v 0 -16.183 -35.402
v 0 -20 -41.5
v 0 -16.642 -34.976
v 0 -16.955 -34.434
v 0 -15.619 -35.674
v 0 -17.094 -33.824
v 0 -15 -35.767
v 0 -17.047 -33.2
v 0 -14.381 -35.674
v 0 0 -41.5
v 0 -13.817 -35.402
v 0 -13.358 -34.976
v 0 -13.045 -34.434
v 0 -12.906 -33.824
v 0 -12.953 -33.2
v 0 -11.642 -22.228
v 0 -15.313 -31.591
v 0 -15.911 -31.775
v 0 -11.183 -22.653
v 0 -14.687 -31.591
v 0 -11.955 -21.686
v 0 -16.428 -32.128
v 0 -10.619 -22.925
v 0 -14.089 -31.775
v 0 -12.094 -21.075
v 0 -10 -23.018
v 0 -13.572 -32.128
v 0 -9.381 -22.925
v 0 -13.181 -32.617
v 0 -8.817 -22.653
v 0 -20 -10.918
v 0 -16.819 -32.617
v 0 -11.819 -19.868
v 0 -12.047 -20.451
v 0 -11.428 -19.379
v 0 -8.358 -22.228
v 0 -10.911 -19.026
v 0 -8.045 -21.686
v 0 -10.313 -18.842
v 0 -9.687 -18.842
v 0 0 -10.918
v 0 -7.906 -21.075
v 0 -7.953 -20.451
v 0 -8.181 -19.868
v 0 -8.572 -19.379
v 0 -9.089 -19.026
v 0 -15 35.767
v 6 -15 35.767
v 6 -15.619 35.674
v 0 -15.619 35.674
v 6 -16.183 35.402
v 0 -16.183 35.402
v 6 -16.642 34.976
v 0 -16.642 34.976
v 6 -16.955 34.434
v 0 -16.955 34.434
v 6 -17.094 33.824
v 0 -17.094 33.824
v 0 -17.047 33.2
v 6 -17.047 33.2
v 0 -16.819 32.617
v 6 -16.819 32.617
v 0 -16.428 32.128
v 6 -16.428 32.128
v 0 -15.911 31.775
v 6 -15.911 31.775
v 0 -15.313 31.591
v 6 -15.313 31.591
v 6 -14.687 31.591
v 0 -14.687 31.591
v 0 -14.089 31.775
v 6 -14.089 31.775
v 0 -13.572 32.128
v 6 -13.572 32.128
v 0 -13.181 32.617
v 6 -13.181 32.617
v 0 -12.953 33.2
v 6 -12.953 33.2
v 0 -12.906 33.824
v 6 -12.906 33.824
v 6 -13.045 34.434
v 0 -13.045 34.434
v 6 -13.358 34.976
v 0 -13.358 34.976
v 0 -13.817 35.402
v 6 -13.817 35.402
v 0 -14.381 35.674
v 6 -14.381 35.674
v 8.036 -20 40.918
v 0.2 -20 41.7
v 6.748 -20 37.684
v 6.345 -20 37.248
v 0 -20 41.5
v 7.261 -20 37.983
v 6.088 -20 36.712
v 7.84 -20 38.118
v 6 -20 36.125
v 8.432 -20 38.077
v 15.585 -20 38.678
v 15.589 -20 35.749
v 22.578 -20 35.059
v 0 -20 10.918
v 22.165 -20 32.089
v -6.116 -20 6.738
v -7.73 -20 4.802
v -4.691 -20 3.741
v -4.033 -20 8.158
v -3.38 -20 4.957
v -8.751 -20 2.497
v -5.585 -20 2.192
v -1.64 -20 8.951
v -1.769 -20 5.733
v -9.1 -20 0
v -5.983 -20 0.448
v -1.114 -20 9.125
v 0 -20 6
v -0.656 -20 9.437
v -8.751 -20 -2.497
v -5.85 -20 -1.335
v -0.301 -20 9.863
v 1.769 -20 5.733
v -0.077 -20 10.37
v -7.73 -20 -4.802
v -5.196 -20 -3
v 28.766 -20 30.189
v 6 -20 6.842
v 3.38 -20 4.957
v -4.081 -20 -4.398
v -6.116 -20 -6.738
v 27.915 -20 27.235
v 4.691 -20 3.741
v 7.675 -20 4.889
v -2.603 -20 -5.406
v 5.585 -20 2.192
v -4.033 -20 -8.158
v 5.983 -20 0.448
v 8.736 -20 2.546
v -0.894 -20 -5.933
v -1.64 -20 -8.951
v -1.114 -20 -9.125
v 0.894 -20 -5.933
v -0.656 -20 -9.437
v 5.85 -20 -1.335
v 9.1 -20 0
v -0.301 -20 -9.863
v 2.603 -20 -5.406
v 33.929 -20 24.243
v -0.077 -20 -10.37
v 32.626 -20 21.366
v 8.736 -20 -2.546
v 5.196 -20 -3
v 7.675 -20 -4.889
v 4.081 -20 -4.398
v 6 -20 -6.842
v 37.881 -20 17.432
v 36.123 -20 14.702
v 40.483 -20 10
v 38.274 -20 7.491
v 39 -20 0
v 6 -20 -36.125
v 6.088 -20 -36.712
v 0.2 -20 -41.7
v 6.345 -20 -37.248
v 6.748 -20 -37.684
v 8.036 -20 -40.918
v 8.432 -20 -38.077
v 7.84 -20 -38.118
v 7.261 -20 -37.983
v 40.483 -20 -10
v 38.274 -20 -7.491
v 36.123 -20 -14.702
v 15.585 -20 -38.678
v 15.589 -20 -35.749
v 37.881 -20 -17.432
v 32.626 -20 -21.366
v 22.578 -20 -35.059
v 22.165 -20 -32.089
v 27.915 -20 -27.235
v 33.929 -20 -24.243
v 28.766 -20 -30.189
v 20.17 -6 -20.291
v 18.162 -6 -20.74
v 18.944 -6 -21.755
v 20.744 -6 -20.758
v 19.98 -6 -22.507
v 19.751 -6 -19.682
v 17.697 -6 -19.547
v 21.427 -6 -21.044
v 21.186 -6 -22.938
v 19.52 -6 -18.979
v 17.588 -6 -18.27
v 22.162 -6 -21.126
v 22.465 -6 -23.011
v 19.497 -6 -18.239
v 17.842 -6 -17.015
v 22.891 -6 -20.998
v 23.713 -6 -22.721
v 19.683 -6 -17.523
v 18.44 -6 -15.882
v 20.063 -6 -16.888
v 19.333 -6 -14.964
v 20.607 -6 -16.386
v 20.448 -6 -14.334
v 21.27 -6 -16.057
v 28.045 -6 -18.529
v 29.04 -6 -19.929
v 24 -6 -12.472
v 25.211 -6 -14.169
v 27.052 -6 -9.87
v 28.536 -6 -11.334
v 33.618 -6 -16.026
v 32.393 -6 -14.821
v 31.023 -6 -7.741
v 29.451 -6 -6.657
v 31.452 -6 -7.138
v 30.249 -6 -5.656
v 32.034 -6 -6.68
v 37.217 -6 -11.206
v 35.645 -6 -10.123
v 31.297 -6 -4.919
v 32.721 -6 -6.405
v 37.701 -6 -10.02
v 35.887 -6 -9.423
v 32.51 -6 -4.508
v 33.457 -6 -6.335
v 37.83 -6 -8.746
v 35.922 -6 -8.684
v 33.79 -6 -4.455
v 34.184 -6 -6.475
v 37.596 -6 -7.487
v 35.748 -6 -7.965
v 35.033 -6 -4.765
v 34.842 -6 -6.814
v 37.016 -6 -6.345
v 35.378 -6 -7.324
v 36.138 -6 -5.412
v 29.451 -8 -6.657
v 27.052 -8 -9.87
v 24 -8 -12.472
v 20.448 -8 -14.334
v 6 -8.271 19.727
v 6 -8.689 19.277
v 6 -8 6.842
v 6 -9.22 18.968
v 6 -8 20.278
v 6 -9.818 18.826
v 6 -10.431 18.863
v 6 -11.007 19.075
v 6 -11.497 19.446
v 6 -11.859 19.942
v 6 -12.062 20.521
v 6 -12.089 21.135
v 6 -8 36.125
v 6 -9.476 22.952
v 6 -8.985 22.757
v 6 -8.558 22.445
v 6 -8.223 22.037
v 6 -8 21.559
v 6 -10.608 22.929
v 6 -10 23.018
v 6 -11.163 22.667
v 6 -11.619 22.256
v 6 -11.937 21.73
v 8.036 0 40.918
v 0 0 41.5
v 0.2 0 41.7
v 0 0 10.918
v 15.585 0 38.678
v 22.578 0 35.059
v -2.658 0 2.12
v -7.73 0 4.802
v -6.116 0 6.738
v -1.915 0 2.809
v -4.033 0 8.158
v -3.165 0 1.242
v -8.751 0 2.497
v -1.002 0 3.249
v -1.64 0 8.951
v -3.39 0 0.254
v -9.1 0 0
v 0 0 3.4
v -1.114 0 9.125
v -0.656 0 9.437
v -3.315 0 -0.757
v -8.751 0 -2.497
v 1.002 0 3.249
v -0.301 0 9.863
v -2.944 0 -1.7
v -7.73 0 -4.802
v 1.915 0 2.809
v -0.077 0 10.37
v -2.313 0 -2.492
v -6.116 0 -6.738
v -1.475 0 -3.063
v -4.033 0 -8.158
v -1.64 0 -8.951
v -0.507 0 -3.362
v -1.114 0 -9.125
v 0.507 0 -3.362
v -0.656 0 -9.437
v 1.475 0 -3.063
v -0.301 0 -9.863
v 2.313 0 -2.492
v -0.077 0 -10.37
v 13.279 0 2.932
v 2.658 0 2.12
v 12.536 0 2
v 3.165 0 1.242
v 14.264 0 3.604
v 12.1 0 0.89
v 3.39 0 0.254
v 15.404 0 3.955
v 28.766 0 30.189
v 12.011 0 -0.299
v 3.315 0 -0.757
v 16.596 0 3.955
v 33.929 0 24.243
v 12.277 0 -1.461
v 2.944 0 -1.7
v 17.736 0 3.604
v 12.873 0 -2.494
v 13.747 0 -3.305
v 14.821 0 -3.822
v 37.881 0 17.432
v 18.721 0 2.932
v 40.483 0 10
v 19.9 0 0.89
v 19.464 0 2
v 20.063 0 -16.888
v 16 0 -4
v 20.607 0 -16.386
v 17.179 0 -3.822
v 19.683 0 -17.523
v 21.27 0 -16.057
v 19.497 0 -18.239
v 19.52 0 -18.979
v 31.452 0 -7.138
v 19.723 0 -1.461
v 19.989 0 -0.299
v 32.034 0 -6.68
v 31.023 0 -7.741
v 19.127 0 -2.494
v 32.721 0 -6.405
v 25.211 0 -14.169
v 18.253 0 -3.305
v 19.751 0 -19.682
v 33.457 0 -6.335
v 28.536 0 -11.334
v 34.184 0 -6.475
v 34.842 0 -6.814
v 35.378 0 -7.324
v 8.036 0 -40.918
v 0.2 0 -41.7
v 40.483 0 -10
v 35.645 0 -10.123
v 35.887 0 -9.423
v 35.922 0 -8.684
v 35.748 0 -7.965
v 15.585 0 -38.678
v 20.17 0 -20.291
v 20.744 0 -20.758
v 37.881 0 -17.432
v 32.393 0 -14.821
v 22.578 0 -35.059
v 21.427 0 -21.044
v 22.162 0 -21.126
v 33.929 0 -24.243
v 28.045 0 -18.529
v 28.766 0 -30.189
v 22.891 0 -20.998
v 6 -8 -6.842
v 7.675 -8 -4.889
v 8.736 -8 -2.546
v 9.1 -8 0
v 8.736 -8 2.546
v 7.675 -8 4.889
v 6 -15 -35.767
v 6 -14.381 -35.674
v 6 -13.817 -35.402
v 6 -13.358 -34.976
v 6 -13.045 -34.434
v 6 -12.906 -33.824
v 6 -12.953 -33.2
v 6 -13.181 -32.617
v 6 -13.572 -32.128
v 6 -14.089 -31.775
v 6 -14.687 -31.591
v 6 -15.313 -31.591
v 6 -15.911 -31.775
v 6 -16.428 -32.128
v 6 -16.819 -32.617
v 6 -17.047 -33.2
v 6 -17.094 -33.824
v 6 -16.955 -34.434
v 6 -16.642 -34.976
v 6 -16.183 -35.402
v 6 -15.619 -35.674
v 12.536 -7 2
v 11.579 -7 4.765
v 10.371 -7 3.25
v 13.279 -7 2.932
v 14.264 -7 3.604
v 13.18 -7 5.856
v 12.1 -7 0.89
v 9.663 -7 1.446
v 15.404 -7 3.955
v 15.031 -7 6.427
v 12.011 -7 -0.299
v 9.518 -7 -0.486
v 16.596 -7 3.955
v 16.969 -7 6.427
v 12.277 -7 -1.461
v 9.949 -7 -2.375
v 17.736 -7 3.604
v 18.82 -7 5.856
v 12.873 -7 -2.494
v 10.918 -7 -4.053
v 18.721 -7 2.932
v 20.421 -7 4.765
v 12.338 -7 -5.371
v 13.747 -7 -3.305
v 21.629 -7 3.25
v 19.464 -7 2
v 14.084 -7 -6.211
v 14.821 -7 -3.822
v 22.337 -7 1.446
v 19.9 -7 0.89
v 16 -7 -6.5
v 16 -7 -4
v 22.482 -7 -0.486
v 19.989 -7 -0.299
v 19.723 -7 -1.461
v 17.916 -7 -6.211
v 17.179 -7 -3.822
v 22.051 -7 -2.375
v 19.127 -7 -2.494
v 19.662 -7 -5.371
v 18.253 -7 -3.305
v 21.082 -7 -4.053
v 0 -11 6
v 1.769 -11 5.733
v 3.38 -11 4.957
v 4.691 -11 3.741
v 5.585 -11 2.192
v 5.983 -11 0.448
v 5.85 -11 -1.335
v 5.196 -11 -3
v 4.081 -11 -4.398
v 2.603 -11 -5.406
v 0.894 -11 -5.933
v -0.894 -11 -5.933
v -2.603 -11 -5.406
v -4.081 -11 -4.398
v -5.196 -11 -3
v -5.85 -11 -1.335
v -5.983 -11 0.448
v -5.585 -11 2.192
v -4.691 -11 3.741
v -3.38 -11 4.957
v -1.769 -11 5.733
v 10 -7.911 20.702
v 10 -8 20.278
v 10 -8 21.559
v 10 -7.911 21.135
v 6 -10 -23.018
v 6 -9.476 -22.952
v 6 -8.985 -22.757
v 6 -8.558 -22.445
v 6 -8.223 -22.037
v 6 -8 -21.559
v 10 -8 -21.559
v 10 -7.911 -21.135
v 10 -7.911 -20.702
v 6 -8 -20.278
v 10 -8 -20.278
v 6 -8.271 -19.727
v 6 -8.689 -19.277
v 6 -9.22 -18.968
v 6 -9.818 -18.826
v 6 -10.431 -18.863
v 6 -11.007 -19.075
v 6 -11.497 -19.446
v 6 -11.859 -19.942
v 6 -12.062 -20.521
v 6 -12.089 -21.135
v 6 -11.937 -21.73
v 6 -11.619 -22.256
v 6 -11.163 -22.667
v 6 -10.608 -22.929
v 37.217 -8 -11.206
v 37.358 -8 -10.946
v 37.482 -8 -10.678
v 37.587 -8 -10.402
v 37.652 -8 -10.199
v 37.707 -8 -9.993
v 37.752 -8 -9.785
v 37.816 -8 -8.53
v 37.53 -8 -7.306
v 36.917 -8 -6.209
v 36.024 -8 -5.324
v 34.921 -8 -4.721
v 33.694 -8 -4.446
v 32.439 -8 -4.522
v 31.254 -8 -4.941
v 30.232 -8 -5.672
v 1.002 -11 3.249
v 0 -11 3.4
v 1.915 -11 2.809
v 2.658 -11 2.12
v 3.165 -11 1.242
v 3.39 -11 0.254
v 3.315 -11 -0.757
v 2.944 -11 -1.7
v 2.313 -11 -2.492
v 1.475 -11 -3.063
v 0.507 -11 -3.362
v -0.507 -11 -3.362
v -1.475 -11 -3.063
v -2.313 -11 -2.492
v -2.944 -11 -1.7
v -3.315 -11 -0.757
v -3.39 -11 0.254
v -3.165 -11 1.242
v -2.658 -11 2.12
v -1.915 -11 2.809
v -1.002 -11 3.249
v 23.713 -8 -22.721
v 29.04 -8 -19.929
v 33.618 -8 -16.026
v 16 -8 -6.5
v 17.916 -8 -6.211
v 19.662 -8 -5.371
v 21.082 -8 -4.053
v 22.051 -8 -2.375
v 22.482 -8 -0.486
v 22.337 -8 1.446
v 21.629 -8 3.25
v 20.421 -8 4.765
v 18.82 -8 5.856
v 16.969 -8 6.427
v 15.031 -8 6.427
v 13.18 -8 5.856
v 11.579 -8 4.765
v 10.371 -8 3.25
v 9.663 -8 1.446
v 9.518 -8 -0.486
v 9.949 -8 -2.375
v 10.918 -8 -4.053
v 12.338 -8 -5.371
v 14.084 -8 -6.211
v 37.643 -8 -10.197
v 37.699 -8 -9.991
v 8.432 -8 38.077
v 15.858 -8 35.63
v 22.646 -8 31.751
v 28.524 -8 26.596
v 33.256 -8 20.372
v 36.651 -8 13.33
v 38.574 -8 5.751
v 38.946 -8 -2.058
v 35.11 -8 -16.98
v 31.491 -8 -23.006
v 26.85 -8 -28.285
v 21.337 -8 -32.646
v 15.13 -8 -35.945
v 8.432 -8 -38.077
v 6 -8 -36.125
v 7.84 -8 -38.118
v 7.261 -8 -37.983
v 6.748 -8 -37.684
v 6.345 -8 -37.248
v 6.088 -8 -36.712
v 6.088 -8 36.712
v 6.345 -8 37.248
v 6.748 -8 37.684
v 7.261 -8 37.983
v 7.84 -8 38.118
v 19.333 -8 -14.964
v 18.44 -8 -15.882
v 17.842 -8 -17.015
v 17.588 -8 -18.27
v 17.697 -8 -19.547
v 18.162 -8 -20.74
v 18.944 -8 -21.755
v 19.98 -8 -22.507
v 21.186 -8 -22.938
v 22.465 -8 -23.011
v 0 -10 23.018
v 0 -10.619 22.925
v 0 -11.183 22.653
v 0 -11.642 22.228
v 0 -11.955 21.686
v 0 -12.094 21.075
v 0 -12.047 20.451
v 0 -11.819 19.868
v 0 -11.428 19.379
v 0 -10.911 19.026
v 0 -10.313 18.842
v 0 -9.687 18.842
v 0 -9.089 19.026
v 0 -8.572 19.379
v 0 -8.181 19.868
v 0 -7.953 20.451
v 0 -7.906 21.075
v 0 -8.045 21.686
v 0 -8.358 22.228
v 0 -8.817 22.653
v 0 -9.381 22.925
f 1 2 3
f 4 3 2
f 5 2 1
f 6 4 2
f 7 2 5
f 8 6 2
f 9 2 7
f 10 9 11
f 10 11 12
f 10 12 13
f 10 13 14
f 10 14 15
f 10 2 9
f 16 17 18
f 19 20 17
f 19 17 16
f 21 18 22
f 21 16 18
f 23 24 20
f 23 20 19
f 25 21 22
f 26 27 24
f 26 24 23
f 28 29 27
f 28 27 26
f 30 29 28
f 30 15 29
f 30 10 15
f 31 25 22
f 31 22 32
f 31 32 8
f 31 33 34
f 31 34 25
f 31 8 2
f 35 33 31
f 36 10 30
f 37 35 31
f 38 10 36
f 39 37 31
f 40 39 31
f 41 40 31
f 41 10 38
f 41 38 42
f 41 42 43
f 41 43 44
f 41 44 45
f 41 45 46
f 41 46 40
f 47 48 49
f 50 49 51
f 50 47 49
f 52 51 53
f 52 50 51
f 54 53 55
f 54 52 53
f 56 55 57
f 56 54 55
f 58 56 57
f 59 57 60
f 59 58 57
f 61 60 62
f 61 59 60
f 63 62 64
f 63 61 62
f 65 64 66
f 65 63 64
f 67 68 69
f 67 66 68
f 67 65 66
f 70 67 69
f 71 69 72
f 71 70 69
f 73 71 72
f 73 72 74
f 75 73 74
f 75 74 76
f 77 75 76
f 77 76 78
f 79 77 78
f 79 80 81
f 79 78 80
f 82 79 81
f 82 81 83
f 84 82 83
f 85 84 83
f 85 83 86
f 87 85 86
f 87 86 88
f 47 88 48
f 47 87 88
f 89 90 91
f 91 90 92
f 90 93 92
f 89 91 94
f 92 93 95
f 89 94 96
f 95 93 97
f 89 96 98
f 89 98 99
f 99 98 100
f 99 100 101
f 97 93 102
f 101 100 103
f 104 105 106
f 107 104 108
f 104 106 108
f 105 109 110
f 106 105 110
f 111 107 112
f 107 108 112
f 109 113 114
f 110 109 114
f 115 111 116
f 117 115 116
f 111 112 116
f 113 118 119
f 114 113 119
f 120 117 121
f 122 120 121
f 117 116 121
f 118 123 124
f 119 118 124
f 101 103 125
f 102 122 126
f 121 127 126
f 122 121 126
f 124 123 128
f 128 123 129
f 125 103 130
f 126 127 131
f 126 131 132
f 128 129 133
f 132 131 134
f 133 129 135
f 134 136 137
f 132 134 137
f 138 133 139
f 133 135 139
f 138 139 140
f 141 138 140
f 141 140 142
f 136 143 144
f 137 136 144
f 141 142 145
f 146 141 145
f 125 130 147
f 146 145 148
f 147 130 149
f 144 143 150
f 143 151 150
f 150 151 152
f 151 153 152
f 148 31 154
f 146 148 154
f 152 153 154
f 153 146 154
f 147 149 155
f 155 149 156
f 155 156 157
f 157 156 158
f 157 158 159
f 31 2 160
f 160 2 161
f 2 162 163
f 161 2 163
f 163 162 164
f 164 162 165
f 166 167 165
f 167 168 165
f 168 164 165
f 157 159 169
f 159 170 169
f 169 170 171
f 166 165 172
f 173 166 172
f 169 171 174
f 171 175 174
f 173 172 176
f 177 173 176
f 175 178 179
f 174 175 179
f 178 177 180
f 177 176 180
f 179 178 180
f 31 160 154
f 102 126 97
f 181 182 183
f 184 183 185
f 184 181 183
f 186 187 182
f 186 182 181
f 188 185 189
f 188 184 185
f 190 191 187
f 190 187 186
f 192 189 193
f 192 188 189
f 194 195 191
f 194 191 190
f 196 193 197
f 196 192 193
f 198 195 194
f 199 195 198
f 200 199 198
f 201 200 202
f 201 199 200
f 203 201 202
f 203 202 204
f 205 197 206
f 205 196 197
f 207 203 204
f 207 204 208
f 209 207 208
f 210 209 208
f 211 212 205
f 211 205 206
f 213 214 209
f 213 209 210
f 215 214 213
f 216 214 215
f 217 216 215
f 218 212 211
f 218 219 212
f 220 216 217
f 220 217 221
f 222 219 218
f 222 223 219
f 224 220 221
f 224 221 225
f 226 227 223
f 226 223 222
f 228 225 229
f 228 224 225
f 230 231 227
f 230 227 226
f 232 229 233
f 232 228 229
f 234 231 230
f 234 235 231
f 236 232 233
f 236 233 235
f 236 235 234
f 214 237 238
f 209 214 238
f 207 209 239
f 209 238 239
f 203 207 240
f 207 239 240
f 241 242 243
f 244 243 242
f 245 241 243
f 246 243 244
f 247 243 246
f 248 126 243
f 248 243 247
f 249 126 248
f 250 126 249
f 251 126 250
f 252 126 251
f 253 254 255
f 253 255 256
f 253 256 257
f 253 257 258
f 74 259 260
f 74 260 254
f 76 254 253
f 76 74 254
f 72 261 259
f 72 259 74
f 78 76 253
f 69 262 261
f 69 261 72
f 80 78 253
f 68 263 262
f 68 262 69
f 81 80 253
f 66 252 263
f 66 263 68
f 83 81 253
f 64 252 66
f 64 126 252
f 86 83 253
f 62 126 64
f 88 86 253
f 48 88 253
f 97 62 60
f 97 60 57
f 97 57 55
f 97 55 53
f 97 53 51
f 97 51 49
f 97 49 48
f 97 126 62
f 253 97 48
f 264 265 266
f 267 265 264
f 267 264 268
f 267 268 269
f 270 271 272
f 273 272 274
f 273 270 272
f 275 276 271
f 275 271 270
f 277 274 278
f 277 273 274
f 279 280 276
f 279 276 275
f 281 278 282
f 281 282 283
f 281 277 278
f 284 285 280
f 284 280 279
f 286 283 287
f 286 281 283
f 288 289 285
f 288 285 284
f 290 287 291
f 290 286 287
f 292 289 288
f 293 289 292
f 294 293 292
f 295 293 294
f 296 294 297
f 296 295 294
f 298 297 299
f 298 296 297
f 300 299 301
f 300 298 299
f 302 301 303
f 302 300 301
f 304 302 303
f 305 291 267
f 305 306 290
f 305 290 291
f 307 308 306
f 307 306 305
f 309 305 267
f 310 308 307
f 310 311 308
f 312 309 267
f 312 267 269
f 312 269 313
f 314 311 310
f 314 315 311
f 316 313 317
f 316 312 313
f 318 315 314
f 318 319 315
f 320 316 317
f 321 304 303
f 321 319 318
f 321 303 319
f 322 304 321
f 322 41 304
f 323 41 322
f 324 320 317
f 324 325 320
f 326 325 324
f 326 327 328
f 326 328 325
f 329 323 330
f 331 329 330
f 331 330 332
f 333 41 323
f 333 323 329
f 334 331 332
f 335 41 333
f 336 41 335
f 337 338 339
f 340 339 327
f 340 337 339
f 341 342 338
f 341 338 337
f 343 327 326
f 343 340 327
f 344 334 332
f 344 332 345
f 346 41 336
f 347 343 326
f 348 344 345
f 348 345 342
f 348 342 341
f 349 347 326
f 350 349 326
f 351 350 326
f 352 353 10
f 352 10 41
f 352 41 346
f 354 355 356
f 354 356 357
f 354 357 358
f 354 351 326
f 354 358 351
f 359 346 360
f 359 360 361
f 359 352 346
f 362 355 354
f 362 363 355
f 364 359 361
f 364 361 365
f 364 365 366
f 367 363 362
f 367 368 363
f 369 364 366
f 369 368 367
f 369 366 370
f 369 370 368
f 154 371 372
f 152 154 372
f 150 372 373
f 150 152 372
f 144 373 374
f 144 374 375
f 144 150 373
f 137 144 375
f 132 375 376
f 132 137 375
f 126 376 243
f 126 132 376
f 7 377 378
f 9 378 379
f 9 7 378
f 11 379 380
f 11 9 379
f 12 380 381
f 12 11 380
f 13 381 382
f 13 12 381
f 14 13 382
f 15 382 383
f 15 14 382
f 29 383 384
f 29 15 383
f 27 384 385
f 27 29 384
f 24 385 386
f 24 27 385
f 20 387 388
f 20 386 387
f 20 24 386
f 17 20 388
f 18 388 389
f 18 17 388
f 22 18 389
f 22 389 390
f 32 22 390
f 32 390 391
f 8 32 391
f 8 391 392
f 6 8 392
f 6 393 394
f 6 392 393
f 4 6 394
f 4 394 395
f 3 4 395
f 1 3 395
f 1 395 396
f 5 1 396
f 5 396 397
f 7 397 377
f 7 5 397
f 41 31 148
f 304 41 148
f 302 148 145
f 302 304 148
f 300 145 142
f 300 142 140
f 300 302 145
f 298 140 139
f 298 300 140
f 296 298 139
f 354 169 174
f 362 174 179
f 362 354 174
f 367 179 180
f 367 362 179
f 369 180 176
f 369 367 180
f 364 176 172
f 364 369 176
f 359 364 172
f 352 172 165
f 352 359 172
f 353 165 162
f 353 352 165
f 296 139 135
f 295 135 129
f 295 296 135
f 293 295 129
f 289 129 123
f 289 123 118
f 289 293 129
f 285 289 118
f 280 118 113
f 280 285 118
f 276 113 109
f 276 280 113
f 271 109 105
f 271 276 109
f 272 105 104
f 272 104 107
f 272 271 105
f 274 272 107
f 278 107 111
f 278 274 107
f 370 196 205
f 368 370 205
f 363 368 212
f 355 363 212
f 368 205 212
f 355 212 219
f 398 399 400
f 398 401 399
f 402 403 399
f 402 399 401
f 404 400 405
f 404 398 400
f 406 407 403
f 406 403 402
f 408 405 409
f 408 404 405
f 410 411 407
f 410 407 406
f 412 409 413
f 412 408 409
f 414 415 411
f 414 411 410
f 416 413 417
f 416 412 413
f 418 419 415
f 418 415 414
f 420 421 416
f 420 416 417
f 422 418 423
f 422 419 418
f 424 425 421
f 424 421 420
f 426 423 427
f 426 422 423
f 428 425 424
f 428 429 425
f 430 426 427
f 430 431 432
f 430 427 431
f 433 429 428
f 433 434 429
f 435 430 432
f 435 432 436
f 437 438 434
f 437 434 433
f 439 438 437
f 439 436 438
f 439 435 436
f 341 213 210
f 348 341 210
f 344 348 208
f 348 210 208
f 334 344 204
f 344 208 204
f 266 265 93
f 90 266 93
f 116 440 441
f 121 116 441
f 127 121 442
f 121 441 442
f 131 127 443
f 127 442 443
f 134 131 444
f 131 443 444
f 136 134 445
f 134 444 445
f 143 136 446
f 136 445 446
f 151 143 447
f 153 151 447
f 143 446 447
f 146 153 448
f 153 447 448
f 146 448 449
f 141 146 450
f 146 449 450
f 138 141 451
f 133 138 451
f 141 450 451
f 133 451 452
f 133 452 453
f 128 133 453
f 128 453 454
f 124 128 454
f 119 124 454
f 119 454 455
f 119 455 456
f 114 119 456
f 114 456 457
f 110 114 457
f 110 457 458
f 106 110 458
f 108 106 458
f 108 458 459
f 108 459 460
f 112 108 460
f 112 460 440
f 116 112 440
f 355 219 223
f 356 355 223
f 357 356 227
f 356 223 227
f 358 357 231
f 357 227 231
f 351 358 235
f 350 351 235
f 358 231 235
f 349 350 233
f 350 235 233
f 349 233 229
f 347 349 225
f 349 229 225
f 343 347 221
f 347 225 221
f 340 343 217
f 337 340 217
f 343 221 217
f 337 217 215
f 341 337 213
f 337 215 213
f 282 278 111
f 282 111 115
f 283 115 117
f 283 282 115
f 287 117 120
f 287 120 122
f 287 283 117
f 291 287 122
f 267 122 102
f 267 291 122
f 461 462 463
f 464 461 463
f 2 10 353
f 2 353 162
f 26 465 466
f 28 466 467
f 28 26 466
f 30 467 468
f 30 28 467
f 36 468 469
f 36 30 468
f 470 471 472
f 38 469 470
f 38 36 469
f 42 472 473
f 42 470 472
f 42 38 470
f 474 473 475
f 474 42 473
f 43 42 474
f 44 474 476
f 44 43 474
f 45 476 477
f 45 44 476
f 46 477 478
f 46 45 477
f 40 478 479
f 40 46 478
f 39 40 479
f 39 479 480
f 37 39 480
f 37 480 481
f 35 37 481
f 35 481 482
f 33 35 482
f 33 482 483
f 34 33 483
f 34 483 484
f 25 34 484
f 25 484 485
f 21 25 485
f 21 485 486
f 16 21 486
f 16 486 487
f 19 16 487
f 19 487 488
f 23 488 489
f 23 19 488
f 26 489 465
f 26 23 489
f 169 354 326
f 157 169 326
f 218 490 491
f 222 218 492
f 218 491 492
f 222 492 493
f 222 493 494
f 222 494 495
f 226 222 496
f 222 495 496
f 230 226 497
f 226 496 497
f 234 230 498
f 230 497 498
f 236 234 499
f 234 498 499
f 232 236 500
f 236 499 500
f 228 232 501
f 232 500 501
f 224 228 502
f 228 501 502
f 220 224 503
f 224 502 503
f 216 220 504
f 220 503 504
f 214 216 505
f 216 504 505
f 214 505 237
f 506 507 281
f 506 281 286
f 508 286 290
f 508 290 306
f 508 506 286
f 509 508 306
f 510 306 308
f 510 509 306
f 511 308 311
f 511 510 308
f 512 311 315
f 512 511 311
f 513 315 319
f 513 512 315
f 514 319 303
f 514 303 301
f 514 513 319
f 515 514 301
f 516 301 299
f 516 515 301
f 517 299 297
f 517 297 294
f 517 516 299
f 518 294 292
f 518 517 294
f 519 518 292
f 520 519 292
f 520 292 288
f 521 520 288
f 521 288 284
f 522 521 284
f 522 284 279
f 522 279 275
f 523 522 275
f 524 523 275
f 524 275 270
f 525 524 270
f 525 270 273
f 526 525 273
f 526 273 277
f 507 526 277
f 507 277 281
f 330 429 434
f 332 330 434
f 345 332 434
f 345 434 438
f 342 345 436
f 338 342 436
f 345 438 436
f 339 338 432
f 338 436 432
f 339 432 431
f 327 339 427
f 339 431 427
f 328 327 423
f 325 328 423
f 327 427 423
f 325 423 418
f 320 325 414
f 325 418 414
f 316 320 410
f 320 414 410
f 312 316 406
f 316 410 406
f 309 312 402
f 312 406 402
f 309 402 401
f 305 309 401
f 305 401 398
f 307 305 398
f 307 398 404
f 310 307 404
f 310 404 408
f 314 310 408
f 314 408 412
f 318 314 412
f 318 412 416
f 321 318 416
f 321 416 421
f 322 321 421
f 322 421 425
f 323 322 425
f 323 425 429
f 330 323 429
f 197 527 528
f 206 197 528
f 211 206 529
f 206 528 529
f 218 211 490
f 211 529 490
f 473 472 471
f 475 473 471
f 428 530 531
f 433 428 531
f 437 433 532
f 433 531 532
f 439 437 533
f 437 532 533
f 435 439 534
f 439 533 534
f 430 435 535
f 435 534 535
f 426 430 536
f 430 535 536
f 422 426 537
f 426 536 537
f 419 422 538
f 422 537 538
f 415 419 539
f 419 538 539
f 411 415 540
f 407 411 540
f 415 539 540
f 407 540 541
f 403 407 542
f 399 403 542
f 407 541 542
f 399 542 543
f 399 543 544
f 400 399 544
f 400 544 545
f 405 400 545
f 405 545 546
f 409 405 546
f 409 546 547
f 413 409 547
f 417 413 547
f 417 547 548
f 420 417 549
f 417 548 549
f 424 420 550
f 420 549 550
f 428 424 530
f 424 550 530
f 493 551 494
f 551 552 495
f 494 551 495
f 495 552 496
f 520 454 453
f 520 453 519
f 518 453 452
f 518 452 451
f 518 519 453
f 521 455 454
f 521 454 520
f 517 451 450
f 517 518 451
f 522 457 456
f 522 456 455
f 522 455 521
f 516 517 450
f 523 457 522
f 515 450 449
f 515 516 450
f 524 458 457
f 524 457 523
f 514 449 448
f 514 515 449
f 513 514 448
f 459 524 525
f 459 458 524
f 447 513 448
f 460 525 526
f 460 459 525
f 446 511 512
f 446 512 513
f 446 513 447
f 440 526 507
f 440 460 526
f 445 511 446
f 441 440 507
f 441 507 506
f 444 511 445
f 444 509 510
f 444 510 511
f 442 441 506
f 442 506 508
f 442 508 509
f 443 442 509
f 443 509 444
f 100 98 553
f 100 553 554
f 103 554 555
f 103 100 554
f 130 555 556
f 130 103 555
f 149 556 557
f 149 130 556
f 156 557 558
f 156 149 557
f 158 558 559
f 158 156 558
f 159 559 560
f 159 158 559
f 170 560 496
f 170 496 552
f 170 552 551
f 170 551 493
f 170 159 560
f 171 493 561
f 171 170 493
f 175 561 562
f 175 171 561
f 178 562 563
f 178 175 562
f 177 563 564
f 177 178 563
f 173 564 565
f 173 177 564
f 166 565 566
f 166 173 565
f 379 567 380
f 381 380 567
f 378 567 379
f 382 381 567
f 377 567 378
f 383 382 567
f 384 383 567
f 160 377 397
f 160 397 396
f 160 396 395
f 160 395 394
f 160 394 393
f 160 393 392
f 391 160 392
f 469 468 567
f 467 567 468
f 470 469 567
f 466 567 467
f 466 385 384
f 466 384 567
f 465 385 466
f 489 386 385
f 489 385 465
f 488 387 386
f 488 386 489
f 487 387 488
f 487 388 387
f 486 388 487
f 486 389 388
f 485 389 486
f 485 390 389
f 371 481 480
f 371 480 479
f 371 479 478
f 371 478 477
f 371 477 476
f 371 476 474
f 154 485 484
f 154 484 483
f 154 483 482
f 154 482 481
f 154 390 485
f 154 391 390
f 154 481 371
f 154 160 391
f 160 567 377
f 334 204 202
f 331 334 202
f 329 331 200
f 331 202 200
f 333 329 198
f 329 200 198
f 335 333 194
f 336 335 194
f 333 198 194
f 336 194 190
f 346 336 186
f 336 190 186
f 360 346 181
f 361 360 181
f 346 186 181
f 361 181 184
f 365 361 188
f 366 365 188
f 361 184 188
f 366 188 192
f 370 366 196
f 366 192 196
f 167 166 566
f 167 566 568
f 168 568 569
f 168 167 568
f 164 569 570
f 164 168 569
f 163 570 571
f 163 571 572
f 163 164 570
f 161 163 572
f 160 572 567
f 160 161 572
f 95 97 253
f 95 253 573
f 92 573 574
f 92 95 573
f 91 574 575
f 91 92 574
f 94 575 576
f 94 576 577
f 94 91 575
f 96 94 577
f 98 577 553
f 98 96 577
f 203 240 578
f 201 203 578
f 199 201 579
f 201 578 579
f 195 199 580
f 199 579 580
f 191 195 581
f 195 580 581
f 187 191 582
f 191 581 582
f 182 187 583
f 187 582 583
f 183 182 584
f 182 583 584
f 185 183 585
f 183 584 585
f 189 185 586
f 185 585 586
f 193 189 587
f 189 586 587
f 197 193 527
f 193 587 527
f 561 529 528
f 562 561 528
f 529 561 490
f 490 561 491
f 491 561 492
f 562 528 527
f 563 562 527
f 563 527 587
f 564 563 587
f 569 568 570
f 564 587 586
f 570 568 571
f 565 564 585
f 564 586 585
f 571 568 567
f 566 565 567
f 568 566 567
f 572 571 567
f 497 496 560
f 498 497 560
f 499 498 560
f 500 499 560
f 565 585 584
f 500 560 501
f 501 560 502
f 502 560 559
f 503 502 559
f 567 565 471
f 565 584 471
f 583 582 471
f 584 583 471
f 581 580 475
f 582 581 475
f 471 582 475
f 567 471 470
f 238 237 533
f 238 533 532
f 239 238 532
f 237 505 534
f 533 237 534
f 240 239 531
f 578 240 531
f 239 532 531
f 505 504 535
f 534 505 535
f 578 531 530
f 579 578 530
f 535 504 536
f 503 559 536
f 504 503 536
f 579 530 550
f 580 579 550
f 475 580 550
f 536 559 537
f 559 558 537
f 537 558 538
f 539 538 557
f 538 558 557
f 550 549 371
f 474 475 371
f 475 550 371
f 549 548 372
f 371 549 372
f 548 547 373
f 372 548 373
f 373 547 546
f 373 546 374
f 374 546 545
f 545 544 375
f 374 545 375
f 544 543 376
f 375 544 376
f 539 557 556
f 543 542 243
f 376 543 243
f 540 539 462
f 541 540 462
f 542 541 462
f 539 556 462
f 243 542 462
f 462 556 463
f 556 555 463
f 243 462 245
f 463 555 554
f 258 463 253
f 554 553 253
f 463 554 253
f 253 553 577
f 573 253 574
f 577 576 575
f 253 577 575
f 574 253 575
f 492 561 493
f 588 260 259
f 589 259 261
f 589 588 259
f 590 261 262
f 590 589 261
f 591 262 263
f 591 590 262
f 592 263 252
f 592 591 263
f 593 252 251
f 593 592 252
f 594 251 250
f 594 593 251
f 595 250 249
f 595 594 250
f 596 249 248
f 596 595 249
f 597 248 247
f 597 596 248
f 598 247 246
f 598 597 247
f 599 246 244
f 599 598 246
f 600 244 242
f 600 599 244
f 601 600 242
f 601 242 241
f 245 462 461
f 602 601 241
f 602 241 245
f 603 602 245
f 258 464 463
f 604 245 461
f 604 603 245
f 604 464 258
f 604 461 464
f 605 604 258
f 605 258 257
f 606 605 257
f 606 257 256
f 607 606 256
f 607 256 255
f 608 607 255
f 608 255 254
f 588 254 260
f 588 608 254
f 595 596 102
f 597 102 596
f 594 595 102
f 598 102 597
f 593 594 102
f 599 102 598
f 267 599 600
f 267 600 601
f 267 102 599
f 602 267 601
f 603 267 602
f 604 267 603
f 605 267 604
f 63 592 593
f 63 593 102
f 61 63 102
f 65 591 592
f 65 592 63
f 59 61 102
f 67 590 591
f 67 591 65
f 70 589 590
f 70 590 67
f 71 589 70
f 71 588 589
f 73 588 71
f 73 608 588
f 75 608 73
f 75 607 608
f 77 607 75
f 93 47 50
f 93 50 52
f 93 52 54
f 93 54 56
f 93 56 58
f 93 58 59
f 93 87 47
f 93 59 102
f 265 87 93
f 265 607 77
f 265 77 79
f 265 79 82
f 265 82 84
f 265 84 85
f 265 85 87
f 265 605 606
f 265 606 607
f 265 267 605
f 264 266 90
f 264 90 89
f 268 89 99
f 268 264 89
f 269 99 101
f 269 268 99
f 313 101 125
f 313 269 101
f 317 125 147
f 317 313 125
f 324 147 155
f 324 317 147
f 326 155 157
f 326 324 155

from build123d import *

# Parameters (mm, degrees)
SKETCH_1_R          = 6
EXTRUDE_1_DEPTH     = 20
SKETCH_2_R          = 6.1
EXTRUDE_2_DEPTH     = 11
SKETCH_3_R          = 3.4
CUT_EXTRUDE_1_DEPTH = 60.989832472
SKETCH_4_R          = 2.1
CUT_EXTRUDE_2_DEPTH = 10
CUT_EXTRUDE_3_DEPTH = 63.271823484
CUT_EXTRUDE_4_DEPTH = 12
SKETCH_7_R          = 6.5
CUT_EXTRUDE_5_DEPTH = 1
SKETCH_8_R          = 4
CUT_EXTRUDE_6_DEPTH = 60.554848669
CUT_EXTRUDE_7_DEPTH = 60.344586948
CUT_EXTRUDE_8_DEPTH = 2
CHAMFER_1_SIZE      = 0.2


with BuildPart() as part:
    # 草图1 → 凸台-拉伸1 (new body)
    with BuildSketch(Plane(origin=(0, 0, 0), x_dir=(1, 0, 0), z_dir=(0, 1, 0))):
        with BuildLine():
            Line((0, 41.7), (0, 10.918333206))
            ThreePointArc((0, 10.918333206), (-0.463653568, 9.637849063), (-1.63963964, 8.951065962))
            ThreePointArc((-1.63963964, 8.951065962), (-9.1, 0), (-1.63963964, -8.951065962))
            ThreePointArc((-1.63963964, -8.951065962), (-0.463653568, -9.637849063), (0, -10.918333206))
            Line((0, -10.918333206), (0, -41.7))
            ThreePointArc((0, -41.7), (41.7, 0), (0, 41.7))
        make_face()
        with Locations(Location((0, 0, 0), (0, 0, 270))):
            Circle(SKETCH_1_R, mode=Mode.SUBTRACT)
    extrude(amount=EXTRUDE_1_DEPTH)

    # 草图2 → 凸台-拉伸2 (add)
    with BuildSketch(Plane.XZ):
        Circle(SKETCH_2_R)
    extrude(amount=-EXTRUDE_2_DEPTH)

    # 草图3 → 切除-拉伸1 (cut, through all)
    with BuildSketch(Plane(origin=(0, 11, 0), x_dir=(1, 0, 0), z_dir=(0, 1, 0))):
        with Locations(Location((0, 0, 0), (0, 0, 270))):
            Circle(SKETCH_3_R)
    extrude(amount=-CUT_EXTRUDE_1_DEPTH, mode=Mode.SUBTRACT)

    # 草图4 → 切除-拉伸2 (cut)
    with BuildSketch(Plane.ZY):
        with Locations((33.667083302, 15)):
            Circle(SKETCH_4_R)
        with Locations((20.918333206, 10)):
            Circle(SKETCH_4_R)
        with Locations(Location((-33.667083302, 15, 0), (0, 0, 180))):
            Circle(SKETCH_4_R)
        with Locations(Location((-20.918333206, 10, 0), (0, 0, 180))):
            Circle(SKETCH_4_R)
    extrude(amount=-CUT_EXTRUDE_2_DEPTH, mode=Mode.SUBTRACT)


with BuildPart() as body_2:
    # 镜向1: mirrored copy
    add(part.part.mirror(Plane.ZX))

    # 草图5 → 切除-拉伸3 (cut, through all)
    with BuildSketch(Plane(origin=(0, 0, 0), x_dir=(1, 0, 0), z_dir=(0, 1, 0))):
        with BuildLine():
            Line((40.483206395, 10), (40.483206395, -10))
            ThreePointArc((40.483206395, -10), (41.394683878, -5.036878663), (41.7, 0))
            ThreePointArc((41.7, 0), (41.394683878, 5.036878663), (40.483206395, 10))
        make_face()
    extrude(amount=-CUT_EXTRUDE_3_DEPTH, mode=Mode.SUBTRACT)

    # 草图6 → 切除-拉伸4 (cut)
    with BuildSketch(Plane.XZ.offset(20)):
        with BuildLine():
            Line((6, -36.124783736), (6, -6.841783393))
            ThreePointArc((6, -6.841783393), (9.1, 0), (6, 6.841783393))
            Line((6, 6.841783393), (6, 36.124783736))
            ThreePointArc((6, 36.124783736), (6.747974614, 37.684409471), (8.432432432, 38.077474749))
            ThreePointArc((8.432432432, 38.077474749), (39, 0), (8.432432432, -38.077474749))
            ThreePointArc((8.432432432, -38.077474749), (6.747974614, -37.684409471), (6, -36.124783736))
        make_face()
    extrude(amount=-CUT_EXTRUDE_4_DEPTH, mode=Mode.SUBTRACT)

    # 草图7 → 切除-拉伸5 (cut)
    with BuildSketch(Plane.XZ.offset(8)):
        with Locations(Location((16, 0, 0), (0, 0, 270))):
            Circle(SKETCH_7_R)
    extrude(amount=-CUT_EXTRUDE_5_DEPTH, mode=Mode.SUBTRACT)

    # 草图8 → 切除-拉伸6 (cut, through all)
    with BuildSketch(Plane.XZ.offset(7)):
        with Locations(Location((16, 0, 0), (0, 0, 270))):
            Circle(SKETCH_8_R)
    extrude(amount=-CUT_EXTRUDE_6_DEPTH, mode=Mode.SUBTRACT)

    # 草图9 → 切除-拉伸7 (cut, through all)
    with BuildSketch(Plane.XZ.offset(8)):
        with BuildLine():
            ThreePointArc((22.891243611, -20.998113284), (30.339314214, -16.81648203), (35.645345475, -10.122766478))
            ThreePointArc((35.645345475, -10.122766478), (34.525042064, -6.62063566), (31.022911246, -7.740939071))
            ThreePointArc((31.022911246, -7.740939071), (26.965357928, -12.859662729), (21.269774526, -16.057380747))
            ThreePointArc((21.269774526, -16.057380747), (19.6101428, -19.338481558), (22.891243611, -20.998113284))
        make_face()
    extrude(amount=-CUT_EXTRUDE_7_DEPTH, mode=Mode.SUBTRACT)

    # 草图10 → 切除-拉伸8 (cut)
    with BuildSketch(Plane.XZ.offset(8)):
        with BuildLine():
            ThreePointArc((23.712726546, -22.721297552), (31.438040853, -18.105017627), (37.217069697, -11.206224463))
            ThreePointArc((37.217069697, -11.206224463), (35.608500049, -5.048911438), (29.451187024, -6.657481086))
            ThreePointArc((29.451187024, -6.657481086), (25.598501128, -11.256676528), (20.44829159, -14.334196479))
            ThreePointArc((20.44829159, -14.334196479), (17.886958532, -20.159964494), (23.712726546, -22.721297552))
        make_face()
    extrude(amount=-CUT_EXTRUDE_8_DEPTH, mode=Mode.SUBTRACT)

    # 倒角1
    chamfer_1_edges = [body_2.edges().sort_by_distance(p)[0] for p in [
        (0, -10, 41.7),
        (0, -10, -41.7),
    ]]
    chamfer(chamfer_1_edges, length=CHAMFER_1_SIZE)


solid = body_2.part
